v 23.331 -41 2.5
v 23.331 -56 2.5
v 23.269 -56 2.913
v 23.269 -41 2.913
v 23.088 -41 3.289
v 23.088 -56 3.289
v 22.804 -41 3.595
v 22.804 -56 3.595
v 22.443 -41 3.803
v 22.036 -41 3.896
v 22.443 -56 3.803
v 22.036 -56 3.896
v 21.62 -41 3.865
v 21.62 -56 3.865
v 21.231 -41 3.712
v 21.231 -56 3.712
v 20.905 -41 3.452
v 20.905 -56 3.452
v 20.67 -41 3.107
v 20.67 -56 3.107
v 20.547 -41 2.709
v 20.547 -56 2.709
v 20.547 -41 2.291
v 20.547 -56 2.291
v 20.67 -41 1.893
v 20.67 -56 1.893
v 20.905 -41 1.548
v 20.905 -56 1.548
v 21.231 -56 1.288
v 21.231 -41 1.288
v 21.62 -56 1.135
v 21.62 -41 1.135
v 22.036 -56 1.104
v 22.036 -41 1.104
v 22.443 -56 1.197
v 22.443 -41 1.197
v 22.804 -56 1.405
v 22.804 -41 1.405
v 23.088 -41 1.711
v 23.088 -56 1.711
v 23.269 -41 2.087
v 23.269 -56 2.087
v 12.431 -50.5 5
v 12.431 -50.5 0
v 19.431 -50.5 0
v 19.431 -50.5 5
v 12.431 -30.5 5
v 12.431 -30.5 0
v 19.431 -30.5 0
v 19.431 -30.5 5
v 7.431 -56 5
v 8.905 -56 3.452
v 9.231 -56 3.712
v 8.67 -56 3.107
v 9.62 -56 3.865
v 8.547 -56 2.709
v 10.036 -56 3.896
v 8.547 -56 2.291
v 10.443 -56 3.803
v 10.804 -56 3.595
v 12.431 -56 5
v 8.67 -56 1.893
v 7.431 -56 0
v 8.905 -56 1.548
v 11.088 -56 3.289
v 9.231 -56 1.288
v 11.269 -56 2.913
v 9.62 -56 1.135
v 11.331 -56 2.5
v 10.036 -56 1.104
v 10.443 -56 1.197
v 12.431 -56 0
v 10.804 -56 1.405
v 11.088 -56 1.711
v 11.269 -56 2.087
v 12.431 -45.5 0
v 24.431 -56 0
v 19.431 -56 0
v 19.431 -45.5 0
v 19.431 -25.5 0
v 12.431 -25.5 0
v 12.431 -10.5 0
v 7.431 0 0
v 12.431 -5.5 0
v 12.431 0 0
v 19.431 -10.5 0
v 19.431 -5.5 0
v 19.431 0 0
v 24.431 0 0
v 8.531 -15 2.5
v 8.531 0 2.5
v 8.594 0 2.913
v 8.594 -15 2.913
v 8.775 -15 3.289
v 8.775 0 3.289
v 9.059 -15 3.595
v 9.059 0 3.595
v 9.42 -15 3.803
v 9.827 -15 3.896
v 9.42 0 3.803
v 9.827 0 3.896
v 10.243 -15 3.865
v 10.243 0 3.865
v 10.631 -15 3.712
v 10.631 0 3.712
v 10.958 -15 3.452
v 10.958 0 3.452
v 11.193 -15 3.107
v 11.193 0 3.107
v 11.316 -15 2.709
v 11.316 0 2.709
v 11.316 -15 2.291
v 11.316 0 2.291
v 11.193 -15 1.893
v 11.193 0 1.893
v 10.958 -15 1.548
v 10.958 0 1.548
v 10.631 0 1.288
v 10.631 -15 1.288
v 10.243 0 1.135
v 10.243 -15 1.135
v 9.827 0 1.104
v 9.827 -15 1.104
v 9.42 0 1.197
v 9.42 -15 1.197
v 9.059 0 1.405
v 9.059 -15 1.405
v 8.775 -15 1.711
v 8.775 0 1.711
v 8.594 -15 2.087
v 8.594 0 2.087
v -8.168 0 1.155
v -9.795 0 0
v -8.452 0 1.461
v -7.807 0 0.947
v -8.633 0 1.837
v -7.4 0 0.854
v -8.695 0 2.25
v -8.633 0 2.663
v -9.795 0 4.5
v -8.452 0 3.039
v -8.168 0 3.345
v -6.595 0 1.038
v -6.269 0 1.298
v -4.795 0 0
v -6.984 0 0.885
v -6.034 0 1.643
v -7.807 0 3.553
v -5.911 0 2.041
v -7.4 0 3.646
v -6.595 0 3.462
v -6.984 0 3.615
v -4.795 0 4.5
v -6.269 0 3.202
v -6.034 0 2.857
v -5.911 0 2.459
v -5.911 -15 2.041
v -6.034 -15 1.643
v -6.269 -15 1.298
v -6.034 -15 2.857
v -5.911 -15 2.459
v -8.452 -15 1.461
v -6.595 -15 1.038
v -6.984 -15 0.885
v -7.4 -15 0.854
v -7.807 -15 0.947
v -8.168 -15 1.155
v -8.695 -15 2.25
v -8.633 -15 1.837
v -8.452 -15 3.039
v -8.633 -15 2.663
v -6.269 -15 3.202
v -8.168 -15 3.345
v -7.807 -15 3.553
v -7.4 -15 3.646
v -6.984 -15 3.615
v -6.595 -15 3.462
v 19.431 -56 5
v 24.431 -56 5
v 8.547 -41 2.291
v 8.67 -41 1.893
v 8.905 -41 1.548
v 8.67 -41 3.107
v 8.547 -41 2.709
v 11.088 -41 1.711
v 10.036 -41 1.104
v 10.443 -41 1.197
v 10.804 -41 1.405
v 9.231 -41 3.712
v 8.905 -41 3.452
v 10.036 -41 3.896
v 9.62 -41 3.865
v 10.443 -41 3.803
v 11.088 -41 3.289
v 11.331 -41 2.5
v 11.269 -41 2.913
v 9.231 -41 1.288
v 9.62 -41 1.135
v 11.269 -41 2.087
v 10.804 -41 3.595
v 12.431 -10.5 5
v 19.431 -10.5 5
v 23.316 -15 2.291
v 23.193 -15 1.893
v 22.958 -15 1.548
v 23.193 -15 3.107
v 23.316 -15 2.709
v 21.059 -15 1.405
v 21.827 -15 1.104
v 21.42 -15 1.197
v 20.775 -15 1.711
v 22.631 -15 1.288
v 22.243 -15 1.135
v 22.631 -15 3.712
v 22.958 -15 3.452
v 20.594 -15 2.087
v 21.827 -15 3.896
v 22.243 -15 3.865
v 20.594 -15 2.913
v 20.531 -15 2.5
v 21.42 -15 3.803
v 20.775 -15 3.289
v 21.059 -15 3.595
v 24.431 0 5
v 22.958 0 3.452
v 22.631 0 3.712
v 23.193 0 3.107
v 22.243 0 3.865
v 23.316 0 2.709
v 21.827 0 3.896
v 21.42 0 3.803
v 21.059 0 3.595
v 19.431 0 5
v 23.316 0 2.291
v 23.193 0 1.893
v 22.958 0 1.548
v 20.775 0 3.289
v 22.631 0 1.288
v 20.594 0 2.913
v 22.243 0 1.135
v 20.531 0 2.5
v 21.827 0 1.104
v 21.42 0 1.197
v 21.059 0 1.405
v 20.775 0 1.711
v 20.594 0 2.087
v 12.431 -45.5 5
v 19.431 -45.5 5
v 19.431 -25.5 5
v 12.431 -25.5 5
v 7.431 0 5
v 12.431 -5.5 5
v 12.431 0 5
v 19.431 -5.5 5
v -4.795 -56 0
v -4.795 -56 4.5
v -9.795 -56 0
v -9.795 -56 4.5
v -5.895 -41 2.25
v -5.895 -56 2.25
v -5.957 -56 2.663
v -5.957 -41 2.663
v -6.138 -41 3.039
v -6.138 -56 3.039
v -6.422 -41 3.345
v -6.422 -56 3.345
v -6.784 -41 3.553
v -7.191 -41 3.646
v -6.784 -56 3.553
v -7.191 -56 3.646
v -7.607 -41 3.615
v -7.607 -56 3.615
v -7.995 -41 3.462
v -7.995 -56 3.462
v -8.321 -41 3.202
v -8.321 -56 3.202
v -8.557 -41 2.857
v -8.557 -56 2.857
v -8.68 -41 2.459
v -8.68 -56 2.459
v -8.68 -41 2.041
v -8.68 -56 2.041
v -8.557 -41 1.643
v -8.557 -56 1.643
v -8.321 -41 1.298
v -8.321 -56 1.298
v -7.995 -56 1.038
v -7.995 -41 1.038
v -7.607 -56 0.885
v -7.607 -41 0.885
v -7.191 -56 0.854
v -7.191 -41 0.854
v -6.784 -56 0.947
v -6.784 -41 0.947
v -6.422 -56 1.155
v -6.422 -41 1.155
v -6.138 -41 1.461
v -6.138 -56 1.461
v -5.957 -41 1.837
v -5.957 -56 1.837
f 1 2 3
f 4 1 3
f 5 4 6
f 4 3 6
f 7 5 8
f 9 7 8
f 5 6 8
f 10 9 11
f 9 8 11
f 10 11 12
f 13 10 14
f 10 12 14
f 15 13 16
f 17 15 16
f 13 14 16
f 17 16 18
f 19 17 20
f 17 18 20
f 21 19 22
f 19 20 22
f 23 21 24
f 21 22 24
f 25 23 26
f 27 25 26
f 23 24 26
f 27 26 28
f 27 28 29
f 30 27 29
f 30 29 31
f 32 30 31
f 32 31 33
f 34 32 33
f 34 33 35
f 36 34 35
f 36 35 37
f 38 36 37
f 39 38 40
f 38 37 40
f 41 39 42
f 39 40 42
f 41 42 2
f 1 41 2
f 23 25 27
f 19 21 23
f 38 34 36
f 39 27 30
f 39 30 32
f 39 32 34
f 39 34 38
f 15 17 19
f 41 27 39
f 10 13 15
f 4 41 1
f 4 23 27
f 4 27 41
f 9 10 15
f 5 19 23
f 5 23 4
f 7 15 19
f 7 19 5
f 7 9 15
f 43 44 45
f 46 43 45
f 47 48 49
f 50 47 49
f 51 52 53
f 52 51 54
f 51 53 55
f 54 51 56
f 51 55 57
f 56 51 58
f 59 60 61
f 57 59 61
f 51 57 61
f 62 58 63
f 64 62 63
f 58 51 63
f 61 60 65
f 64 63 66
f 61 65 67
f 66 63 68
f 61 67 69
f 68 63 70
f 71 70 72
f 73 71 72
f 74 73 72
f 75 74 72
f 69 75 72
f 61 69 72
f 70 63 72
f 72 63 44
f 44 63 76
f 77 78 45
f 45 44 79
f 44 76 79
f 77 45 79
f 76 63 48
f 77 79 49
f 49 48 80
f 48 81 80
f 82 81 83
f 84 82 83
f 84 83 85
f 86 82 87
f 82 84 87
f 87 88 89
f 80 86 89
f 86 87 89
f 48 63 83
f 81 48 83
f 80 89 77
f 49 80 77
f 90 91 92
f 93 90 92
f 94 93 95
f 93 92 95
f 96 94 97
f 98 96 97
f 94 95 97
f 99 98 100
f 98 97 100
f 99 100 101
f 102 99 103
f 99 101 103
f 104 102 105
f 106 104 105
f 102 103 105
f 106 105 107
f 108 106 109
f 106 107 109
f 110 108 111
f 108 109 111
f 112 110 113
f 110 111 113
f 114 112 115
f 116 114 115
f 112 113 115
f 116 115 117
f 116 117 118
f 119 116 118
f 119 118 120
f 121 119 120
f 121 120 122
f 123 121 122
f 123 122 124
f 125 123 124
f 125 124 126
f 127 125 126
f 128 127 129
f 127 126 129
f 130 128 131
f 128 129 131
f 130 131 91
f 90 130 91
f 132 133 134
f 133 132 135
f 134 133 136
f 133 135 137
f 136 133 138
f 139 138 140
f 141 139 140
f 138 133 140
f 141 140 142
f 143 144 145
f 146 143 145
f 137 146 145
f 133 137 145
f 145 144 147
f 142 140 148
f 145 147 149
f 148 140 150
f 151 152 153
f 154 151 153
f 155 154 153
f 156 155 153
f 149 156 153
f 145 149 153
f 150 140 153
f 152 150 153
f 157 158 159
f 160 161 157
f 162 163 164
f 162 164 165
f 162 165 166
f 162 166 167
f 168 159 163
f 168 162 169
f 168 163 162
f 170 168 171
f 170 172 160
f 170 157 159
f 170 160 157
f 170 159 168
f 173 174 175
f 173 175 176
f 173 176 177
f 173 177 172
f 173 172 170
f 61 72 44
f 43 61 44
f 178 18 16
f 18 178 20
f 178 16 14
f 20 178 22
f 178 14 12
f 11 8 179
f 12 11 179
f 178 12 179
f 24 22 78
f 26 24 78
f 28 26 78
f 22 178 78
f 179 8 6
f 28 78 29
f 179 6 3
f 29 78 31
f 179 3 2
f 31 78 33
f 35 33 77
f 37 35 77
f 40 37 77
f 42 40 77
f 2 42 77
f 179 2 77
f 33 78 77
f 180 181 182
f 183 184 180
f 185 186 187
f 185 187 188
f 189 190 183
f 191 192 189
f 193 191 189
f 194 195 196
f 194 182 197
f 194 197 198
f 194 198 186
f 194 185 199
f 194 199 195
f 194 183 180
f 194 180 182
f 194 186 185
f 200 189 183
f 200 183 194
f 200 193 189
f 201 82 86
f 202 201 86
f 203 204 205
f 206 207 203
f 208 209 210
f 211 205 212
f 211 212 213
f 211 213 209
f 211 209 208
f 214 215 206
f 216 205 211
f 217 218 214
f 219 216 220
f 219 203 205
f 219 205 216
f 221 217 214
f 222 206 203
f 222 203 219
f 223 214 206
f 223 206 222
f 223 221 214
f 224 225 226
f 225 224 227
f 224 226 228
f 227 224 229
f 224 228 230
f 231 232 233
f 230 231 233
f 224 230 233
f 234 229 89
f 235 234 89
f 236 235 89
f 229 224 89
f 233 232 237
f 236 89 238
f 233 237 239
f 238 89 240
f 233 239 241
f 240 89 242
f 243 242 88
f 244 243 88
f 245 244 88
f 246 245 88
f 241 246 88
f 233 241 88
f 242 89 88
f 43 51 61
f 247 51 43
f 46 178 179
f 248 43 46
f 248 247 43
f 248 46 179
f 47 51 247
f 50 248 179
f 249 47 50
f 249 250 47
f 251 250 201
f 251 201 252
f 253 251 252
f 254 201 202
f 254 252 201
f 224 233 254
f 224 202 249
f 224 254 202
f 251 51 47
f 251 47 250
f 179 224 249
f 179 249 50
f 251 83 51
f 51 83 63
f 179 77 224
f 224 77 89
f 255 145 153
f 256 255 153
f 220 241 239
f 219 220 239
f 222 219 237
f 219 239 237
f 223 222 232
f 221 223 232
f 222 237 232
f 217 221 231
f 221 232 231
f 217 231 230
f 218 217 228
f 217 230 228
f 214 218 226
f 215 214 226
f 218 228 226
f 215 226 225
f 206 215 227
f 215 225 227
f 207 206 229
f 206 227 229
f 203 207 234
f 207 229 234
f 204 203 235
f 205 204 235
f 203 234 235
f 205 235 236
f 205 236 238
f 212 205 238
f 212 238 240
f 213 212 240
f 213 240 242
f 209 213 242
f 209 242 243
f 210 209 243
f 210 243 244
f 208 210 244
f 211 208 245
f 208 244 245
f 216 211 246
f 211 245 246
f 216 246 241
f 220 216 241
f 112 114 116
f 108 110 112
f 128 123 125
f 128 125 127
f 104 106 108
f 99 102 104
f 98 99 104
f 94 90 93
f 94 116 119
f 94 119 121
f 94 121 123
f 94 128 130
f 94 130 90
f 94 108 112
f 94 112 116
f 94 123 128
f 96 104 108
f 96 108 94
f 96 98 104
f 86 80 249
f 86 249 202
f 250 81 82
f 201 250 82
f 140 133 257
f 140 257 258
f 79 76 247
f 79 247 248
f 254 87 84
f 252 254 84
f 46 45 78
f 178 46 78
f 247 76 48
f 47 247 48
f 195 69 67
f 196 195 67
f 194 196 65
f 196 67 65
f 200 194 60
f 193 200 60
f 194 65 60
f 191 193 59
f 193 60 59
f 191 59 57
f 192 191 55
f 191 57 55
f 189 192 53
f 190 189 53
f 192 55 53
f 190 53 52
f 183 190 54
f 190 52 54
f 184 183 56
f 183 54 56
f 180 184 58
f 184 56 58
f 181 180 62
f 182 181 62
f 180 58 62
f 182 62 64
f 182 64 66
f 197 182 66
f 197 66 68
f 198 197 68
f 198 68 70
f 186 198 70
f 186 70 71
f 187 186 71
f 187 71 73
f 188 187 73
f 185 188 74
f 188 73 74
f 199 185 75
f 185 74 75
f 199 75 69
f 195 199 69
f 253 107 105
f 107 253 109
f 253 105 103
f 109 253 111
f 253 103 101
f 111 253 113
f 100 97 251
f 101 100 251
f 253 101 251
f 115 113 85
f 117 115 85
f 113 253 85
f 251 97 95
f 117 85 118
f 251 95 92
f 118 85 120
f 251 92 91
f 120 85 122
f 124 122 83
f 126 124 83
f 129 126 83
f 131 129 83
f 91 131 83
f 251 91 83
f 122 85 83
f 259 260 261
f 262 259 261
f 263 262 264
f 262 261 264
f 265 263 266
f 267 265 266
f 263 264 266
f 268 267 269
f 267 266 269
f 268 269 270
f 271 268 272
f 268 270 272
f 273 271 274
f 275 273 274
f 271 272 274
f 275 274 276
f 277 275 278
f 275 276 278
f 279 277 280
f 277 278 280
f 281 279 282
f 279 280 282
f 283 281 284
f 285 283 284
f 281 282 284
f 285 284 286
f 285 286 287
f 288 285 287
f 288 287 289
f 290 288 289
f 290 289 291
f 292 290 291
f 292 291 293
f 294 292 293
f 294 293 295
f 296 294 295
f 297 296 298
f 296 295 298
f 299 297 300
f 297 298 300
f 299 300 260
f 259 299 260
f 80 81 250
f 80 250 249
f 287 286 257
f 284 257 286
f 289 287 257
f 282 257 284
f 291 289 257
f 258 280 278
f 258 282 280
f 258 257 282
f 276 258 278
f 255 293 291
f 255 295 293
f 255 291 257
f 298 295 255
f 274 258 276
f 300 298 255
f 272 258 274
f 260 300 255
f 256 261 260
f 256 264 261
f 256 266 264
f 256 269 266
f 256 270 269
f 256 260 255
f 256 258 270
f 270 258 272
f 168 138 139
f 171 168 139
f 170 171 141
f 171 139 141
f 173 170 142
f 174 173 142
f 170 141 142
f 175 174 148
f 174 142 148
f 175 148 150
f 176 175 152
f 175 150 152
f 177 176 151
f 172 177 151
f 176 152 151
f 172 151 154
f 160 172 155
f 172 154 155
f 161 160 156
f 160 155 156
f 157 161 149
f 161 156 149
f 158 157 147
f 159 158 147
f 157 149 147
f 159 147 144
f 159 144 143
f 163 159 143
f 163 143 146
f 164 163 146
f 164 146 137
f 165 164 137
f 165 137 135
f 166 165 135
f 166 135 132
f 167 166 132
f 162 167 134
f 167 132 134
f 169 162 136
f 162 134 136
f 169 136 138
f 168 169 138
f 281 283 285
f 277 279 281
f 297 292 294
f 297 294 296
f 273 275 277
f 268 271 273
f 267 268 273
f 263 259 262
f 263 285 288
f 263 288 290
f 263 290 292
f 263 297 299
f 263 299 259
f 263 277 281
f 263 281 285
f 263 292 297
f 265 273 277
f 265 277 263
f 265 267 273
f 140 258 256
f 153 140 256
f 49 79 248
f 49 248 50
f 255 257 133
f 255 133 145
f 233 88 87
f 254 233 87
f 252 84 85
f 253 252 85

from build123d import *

# Parameters (mm, degrees)
F0_W      = 5
F0_H      = 4.5
F1_DEPTH  = 56
F2_R      = 1.4
F3_DEPTH  = 15
F4_R      = 1.4
F5_DEPTH  = 15
F6_W      = 7
F6_H      = 15
F7_DEPTH  = 5
F8_R      = 1.4
F10_DEPTH = 15
F9_R      = 1.4
F11_DEPTH = 15


with BuildPart() as f1:
    # F0 (on Front) → F1 (new body)
    with BuildSketch(Plane.XZ):
        with Locations((-7.295205, 2.25)):
            Rectangle(F0_W, F0_H)
    extrude(amount=F1_DEPTH)

    # F2 (on face) → F3 (cut)
    with BuildSketch(Plane.XZ.offset(56)):
        with Locations((-7.295205, 2.25)):
            Circle(F2_R)
    extrude(amount=-F3_DEPTH, mode=Mode.SUBTRACT)

    # F4 (on face) → F5 (cut)
    with BuildSketch(Plane(origin=(0, 0, 0), x_dir=(-1, 0, 0), z_dir=(0, 1, 0))):
        with Locations((7.295205, 2.25)):
            Circle(F4_R)
    extrude(amount=-F5_DEPTH, mode=Mode.SUBTRACT)


with BuildPart() as f7:
    # F6 (on Top) → F7 (new body)
    with BuildSketch(Plane.XY):
        Polygon((12.431414, 0), (7.431414, 0), (7.431414, -56), (12.431414, -56), (12.431414, -50.5), (19.431414, -50.5), (19.431414, -56), (24.431414, -56), (24.431414, 0), (19.431414, 0), (19.431414, -5.5), (12.431414, -5.5), align=None)
        with Locations((15.931414, -38)):
            Rectangle(F6_W, F6_H, mode=Mode.SUBTRACT)
        with Locations((15.931414, -18)):
            Rectangle(F6_W, F6_H, mode=Mode.SUBTRACT)
    extrude(amount=F7_DEPTH)

    # F8 (on face) → F10 (cut)
    with BuildSketch(Plane.XZ.offset(56)):
        with Locations((9.931414, 2.5)):
            Circle(F8_R)
        with Locations((21.931414, 2.5)):
            Circle(F8_R)
    extrude(amount=-F10_DEPTH, mode=Mode.SUBTRACT)

    # F9 (on face) → F11 (cut)
    with BuildSketch(Plane(origin=(0, 0, 0), x_dir=(-1, 0, 0), z_dir=(0, 1, 0))):
        with Locations((-21.931414, 2.5)):
            Circle(F9_R)
        with Locations((-9.931414, 2.5)):
            Circle(F9_R)
    extrude(amount=-F11_DEPTH, mode=Mode.SUBTRACT)


solid = Compound([f1.part, f7.part])
